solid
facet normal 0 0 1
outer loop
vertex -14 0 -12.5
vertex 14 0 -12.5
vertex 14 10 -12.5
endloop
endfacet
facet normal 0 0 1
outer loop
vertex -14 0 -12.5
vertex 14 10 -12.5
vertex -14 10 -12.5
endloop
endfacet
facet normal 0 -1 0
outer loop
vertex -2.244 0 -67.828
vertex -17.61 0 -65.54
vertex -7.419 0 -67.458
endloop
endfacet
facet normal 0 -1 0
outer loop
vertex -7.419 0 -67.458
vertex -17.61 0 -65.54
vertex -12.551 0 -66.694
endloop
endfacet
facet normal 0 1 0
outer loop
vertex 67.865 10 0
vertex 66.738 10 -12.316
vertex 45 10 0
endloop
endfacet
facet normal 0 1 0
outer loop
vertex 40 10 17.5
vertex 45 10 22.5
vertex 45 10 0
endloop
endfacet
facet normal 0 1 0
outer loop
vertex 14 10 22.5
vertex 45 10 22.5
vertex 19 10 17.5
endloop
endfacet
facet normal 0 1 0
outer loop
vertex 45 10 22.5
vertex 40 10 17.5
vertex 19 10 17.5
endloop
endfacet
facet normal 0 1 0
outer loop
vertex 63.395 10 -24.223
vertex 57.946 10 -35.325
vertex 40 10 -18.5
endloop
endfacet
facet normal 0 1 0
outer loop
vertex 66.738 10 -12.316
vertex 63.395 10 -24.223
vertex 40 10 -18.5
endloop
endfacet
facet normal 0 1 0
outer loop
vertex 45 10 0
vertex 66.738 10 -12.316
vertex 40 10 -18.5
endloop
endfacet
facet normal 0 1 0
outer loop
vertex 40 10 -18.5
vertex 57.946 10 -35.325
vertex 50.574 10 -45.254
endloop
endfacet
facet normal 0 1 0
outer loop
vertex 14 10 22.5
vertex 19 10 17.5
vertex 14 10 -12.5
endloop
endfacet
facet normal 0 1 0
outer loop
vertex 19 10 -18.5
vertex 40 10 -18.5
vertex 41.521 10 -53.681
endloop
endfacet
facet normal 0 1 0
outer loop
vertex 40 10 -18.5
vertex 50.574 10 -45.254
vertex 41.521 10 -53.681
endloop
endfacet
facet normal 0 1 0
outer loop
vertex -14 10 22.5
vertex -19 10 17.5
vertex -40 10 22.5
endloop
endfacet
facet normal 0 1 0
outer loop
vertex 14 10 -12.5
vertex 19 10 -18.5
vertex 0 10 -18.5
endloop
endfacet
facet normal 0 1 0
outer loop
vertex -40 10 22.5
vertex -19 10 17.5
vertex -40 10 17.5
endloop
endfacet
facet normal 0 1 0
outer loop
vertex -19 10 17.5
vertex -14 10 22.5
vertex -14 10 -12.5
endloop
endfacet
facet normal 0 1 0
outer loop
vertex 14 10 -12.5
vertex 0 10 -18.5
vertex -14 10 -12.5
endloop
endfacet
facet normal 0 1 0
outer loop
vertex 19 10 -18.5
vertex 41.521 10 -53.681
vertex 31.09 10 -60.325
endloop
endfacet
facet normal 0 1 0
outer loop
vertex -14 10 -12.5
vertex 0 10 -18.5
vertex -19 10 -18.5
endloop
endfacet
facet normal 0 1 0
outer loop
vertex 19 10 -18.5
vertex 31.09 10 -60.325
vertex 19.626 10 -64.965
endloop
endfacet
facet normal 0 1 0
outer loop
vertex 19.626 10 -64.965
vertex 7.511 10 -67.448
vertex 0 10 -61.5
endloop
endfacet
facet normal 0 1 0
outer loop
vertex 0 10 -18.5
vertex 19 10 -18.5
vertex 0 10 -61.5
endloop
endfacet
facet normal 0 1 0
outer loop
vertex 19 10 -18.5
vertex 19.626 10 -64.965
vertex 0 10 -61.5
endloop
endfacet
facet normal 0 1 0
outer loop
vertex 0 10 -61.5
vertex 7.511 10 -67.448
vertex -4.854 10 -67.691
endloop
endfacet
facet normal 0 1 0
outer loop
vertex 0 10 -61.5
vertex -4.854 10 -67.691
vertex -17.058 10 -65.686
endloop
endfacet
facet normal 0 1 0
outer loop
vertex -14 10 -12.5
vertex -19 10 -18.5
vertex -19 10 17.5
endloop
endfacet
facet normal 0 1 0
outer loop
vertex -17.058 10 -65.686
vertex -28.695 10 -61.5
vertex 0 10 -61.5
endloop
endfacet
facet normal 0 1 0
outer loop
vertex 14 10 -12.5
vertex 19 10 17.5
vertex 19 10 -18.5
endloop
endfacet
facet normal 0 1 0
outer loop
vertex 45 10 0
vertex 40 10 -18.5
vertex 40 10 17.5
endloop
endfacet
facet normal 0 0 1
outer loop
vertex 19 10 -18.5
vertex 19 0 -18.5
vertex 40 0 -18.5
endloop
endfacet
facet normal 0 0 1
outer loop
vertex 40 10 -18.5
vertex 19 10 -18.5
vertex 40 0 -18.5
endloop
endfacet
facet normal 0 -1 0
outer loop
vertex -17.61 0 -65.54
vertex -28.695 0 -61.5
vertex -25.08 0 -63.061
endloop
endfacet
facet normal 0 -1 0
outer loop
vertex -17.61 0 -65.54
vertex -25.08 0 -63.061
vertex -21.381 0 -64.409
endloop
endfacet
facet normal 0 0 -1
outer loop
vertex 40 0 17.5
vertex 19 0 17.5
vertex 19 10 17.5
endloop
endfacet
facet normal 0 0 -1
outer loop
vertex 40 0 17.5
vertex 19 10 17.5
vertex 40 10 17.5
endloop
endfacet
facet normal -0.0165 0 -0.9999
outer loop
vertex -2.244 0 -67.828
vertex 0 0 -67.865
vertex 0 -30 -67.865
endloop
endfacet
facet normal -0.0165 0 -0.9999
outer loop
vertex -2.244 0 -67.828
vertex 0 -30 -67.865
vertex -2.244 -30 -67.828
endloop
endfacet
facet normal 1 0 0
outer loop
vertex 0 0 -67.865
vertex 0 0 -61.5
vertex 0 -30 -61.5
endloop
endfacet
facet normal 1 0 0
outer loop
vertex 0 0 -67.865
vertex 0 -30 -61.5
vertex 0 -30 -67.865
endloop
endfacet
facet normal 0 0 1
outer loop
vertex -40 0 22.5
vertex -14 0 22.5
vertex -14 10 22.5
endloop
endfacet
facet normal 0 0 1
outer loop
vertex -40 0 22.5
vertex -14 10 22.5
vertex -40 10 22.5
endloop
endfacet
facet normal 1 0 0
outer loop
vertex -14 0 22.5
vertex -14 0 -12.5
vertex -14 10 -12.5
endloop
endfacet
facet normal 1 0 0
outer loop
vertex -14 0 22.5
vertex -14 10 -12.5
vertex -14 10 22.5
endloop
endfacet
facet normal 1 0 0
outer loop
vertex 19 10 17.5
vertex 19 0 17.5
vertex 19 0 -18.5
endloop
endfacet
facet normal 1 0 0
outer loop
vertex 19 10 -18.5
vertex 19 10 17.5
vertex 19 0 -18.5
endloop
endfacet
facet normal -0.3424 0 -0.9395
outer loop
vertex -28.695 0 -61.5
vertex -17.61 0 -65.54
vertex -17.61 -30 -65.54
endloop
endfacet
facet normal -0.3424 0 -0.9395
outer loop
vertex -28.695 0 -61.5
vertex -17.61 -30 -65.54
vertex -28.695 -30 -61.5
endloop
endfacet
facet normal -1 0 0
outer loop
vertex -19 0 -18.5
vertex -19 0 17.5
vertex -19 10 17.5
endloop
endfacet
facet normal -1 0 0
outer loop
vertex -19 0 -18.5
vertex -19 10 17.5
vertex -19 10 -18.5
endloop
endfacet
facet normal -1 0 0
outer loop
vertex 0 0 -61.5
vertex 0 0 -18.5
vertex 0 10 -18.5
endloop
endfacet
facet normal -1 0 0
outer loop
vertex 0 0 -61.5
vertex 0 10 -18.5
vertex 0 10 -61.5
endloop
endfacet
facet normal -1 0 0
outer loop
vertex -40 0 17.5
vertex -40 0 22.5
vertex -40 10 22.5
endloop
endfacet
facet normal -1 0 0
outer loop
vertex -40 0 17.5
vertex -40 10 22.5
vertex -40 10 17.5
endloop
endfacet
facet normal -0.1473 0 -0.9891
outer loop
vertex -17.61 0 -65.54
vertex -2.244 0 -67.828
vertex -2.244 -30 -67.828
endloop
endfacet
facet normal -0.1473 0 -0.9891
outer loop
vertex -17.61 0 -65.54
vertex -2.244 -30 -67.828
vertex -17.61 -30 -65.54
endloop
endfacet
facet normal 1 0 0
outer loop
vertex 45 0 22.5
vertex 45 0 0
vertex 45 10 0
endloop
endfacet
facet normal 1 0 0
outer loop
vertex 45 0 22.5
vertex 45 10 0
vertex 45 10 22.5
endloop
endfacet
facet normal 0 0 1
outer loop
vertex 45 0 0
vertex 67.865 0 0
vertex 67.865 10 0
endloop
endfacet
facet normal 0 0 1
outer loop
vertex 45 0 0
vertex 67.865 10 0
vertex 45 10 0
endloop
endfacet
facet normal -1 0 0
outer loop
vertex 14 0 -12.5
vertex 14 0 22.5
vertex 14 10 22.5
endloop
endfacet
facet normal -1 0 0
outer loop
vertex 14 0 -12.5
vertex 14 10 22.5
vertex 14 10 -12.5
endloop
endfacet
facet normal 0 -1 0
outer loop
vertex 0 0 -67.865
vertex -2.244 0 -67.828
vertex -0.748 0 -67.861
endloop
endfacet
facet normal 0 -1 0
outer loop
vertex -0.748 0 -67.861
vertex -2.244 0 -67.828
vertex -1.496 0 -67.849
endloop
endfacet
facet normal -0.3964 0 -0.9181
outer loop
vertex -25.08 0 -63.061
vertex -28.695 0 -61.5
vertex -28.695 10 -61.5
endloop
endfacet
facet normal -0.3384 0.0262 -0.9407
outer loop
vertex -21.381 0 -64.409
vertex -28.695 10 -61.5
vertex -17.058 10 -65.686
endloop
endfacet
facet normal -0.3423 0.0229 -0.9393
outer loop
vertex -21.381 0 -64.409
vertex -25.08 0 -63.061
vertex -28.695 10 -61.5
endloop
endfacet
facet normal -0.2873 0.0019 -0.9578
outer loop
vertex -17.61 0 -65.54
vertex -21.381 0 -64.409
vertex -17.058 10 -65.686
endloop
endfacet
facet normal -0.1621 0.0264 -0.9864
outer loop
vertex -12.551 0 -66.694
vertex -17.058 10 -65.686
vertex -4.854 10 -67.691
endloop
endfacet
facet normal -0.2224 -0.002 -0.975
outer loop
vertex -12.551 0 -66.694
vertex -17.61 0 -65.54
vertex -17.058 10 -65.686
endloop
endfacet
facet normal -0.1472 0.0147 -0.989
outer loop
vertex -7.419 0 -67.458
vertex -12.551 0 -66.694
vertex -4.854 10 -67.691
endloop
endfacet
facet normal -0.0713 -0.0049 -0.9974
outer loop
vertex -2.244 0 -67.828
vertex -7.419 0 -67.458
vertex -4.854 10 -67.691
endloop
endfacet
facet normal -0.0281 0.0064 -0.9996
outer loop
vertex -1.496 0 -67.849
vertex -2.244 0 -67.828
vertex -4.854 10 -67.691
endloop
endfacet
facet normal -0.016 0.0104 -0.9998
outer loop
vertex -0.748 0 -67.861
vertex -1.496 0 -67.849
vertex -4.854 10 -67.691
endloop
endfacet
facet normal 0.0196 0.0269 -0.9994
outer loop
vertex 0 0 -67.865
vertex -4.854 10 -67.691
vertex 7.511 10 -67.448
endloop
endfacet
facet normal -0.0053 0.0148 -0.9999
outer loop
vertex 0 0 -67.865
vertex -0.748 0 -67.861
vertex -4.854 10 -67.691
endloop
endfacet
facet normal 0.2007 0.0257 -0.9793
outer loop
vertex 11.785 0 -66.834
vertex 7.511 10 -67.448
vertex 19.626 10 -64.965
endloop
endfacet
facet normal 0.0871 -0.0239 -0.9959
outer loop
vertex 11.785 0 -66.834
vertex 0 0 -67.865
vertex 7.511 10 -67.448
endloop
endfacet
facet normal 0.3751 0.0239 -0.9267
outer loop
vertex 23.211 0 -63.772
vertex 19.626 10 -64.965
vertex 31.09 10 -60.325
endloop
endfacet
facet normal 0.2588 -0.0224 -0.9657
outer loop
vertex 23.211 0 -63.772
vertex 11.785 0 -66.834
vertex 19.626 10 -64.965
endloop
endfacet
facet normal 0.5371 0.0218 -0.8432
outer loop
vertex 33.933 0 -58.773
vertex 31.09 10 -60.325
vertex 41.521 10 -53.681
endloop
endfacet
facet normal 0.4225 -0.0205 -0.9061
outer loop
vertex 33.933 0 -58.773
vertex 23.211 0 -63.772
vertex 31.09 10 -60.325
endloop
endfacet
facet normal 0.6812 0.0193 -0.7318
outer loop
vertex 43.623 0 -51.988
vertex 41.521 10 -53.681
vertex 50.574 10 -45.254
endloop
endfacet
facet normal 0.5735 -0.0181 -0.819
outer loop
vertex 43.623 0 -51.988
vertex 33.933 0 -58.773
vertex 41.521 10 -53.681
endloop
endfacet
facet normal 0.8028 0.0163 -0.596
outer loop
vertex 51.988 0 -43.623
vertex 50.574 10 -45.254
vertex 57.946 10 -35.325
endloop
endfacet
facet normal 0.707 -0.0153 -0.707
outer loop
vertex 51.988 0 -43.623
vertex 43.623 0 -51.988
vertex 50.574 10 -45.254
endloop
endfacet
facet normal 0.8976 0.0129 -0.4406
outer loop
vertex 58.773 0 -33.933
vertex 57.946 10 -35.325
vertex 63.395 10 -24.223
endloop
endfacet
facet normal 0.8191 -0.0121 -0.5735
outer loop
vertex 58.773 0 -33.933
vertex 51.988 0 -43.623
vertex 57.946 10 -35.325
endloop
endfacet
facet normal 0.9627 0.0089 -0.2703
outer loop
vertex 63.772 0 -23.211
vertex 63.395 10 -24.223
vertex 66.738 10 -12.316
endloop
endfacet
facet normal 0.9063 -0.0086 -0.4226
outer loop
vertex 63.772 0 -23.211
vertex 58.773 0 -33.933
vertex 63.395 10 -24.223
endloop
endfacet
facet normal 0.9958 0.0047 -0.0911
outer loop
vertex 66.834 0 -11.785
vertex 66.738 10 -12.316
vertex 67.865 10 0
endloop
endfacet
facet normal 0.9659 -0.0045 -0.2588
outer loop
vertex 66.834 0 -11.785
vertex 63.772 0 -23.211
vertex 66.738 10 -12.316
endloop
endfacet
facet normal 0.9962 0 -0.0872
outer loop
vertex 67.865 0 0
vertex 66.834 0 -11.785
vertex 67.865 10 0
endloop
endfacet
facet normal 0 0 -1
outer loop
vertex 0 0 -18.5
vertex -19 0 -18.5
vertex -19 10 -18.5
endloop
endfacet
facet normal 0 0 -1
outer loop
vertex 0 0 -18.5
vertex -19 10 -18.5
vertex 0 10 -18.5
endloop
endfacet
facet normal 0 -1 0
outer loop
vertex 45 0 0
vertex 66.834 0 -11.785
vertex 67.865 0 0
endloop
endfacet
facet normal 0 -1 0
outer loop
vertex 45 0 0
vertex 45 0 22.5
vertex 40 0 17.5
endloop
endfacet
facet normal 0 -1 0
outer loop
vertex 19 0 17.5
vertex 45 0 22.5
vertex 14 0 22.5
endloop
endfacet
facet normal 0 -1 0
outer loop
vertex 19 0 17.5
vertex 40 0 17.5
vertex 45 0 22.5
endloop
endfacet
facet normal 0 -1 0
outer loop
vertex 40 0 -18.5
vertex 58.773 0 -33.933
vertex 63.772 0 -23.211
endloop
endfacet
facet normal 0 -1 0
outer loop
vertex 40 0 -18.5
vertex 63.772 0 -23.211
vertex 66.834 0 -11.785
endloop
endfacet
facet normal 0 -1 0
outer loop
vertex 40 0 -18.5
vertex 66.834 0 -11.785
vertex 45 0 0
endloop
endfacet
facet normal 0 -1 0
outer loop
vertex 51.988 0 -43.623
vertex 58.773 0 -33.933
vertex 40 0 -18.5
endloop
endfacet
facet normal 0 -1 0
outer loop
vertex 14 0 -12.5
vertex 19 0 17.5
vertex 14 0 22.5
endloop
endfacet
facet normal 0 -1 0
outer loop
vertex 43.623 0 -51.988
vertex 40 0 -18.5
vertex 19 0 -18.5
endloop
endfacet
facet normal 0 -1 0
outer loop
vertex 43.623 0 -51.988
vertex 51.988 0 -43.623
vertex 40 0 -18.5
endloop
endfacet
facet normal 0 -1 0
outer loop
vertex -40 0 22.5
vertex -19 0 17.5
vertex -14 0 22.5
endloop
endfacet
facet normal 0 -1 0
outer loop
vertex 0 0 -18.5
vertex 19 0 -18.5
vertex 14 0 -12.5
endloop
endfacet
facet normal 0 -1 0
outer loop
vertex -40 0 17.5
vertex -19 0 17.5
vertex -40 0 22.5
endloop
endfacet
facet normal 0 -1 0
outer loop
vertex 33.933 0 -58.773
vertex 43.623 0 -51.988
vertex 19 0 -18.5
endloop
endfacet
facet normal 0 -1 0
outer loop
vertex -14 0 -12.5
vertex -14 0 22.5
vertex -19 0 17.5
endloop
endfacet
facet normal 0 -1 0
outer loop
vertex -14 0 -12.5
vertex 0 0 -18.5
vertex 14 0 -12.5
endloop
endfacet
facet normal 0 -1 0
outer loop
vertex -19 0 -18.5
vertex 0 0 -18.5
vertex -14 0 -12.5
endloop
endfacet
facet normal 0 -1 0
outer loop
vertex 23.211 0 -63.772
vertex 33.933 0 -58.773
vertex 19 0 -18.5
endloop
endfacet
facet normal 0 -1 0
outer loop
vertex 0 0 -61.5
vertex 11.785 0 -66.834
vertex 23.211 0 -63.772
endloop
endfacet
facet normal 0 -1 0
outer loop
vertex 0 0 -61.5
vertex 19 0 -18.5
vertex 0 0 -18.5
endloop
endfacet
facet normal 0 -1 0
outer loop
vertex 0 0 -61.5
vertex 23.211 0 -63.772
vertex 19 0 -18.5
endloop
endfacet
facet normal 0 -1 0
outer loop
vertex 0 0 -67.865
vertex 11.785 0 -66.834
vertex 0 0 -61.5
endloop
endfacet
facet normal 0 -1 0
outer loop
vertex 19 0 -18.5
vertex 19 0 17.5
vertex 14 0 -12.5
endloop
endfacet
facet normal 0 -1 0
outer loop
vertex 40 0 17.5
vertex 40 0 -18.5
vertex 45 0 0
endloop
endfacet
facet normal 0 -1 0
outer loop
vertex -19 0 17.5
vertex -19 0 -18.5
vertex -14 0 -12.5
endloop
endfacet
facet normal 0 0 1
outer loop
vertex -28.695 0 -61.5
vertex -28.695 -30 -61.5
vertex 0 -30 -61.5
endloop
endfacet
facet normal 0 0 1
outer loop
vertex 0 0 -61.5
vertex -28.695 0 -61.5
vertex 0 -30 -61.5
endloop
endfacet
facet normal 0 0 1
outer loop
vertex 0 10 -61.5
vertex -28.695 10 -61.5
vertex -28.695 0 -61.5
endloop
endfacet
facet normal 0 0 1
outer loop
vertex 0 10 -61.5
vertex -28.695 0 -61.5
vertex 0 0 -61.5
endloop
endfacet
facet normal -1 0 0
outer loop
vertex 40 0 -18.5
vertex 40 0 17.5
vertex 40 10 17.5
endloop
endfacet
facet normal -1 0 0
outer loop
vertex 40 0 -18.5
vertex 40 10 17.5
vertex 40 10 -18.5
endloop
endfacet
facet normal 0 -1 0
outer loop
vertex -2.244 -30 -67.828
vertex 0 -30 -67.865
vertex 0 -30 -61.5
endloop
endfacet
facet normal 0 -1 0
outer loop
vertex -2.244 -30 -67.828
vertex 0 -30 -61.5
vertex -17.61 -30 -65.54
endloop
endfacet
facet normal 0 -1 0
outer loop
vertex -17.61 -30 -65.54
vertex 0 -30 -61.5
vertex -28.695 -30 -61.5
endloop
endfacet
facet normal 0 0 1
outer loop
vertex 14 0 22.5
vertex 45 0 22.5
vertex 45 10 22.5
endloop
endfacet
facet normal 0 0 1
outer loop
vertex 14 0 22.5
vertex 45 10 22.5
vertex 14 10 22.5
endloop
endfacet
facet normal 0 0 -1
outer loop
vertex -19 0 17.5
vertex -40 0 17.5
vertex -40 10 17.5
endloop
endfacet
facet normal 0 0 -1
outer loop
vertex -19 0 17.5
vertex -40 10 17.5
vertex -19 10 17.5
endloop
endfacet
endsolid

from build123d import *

# Parameters (mm, degrees)
SKETCH2_W           = 21
SKETCH2_H           = 36
BOSS_EXTRUDE1_DEPTH = 10
BOSS_EXTRUDE2_DEPTH = 30


with BuildPart() as part:
    # Sketch2 → Boss-Extrude1 (new body)
    with BuildSketch(Plane(origin=(0, 0, 0), x_dir=(1, 0, 0), z_dir=(0, 1, 0))):
        with BuildLine():
            Line((67.865, 0), (45, 0))
            Line((45, 0), (45, -22.5))
            Line((45, -22.5), (14, -22.5))
            Line((14, -22.5), (14, 12.5))
            Line((14, 12.5), (-14, 12.5))
            Line((-14, 12.5), (-14, -22.5))
            Line((-14, -22.5), (-40, -22.5))
            Line((-40, -22.5), (-40, -17.5))
            Line((-40, -17.5), (-19, -17.5))
            Line((-19, -17.5), (-19, 18.5))
            Line((-19, 18.5), (0, 18.5))
            Line((0, 18.5), (0, 61.5))
            Line((0, 61.5), (-28.695090608, 61.5))
            ThreePointArc((-28.695090608, 61.5), (36.457275686, 57.240940546), (67.865, 0))
        make_face()
        with Locations((29.5, 0.5)):
            Rectangle(SKETCH2_W, SKETCH2_H, mode=Mode.SUBTRACT)
    extrude(amount=BOSS_EXTRUDE1_DEPTH)

    # Sketch3 → Boss-Extrude2 (add)
    with BuildSketch(Plane.XZ):
        Polygon((0, -61.5), (0, -67.865), (-2.244041558, -67.827888825), (-17.609918894, -65.540437758), (-28.695090608, -61.5), align=None)
    extrude(amount=BOSS_EXTRUDE2_DEPTH)


solid = part.part
